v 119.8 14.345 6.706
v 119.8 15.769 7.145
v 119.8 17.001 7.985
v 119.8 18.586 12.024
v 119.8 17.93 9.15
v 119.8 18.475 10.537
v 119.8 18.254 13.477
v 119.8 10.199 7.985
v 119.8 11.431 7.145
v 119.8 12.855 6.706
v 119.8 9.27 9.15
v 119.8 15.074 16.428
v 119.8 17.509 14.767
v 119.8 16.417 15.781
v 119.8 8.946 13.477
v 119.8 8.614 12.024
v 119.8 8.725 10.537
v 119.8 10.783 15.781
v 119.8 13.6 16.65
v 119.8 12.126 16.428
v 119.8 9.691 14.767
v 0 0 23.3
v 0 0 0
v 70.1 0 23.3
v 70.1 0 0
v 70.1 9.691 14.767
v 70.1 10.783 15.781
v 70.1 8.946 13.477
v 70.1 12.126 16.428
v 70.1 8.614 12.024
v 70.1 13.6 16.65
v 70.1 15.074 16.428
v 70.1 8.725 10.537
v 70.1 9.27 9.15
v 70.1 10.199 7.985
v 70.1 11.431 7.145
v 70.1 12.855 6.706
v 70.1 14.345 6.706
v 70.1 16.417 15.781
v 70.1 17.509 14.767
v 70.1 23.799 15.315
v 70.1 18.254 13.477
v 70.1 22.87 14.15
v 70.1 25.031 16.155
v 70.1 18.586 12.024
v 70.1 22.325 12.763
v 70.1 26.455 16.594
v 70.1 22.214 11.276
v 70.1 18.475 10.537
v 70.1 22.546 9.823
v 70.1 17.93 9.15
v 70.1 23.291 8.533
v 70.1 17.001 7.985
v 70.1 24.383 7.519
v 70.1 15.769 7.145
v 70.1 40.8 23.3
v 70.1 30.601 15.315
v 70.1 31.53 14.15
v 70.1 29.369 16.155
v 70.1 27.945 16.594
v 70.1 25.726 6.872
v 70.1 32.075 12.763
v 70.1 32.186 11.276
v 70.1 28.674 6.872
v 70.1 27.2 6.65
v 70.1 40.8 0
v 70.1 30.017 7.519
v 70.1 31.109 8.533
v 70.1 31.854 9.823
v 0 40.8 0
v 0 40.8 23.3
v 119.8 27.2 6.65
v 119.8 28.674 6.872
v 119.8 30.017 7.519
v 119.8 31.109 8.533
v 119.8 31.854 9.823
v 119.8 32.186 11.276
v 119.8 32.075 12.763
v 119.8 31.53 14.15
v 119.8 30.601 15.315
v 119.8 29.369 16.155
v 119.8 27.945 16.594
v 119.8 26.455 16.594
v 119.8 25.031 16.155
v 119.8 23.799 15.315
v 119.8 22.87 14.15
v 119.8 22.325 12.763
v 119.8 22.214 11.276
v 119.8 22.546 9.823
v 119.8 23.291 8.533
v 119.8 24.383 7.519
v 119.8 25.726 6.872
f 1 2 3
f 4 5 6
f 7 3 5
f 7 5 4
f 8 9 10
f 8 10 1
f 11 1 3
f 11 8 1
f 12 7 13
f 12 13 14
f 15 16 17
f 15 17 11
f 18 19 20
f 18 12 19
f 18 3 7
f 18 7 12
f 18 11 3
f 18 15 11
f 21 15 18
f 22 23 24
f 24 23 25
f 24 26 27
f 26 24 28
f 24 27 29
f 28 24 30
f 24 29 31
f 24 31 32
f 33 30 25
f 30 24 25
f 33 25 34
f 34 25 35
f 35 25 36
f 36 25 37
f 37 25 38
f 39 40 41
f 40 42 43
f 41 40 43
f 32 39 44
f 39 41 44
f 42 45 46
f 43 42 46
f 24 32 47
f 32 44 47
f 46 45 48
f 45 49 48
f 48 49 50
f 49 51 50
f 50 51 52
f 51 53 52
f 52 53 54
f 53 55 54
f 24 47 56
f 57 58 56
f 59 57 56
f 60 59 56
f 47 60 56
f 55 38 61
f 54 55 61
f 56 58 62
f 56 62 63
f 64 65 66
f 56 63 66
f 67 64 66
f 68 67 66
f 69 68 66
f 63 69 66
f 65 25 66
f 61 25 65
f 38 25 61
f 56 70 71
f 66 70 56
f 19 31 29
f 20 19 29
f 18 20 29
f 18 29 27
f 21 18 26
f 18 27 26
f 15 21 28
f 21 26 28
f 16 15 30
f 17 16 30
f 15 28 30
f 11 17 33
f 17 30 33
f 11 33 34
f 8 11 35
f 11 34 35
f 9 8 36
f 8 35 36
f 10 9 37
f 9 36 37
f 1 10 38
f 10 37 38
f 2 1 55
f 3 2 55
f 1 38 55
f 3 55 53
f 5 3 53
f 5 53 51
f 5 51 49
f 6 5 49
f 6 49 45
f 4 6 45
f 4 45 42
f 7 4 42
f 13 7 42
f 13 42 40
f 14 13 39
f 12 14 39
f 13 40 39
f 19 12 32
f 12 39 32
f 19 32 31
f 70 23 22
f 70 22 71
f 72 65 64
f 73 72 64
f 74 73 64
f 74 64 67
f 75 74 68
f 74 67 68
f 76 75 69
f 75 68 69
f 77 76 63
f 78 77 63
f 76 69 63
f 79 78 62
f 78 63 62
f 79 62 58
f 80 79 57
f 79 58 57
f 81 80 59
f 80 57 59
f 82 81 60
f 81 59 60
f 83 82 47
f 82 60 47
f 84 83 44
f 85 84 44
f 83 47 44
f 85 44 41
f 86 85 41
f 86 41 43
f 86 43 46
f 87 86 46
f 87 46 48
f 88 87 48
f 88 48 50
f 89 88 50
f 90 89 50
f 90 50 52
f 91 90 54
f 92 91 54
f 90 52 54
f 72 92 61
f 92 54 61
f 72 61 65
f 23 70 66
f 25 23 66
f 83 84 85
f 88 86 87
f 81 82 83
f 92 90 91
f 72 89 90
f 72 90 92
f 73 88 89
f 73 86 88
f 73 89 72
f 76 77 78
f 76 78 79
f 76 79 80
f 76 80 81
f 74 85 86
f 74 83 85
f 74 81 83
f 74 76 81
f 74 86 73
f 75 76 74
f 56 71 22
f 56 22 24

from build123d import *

# Parameters (mm, degrees)
SKETCH1_W           = 70.1
SKETCH1_H           = 40.8
BOSS_EXTRUDE1_DEPTH = 23.3
SKETCH2_R           = 5
BOSS_EXTRUDE2_DEPTH = 49.7


with BuildPart() as part:
    # Sketch1 → Boss-Extrude1 (new body)
    with BuildSketch(Plane.XY):
        with Locations((35.05, 20.4)):
            Rectangle(SKETCH1_W, SKETCH1_H)
    extrude(amount=BOSS_EXTRUDE1_DEPTH)

    # Sketch2 → Boss-Extrude2 (add)
    with BuildSketch(Plane(origin=(70.1, 0, 0), x_dir=(0, 0, -1), z_dir=(1, 0, 0))):
        with Locations((-11.65, 27.2)):
            Circle(SKETCH2_R)
        with Locations(Location((-11.65, 13.6, 0), (0, 0, 180))):
            Circle(SKETCH2_R)
    extrude(amount=BOSS_EXTRUDE2_DEPTH)


solid = part.part
